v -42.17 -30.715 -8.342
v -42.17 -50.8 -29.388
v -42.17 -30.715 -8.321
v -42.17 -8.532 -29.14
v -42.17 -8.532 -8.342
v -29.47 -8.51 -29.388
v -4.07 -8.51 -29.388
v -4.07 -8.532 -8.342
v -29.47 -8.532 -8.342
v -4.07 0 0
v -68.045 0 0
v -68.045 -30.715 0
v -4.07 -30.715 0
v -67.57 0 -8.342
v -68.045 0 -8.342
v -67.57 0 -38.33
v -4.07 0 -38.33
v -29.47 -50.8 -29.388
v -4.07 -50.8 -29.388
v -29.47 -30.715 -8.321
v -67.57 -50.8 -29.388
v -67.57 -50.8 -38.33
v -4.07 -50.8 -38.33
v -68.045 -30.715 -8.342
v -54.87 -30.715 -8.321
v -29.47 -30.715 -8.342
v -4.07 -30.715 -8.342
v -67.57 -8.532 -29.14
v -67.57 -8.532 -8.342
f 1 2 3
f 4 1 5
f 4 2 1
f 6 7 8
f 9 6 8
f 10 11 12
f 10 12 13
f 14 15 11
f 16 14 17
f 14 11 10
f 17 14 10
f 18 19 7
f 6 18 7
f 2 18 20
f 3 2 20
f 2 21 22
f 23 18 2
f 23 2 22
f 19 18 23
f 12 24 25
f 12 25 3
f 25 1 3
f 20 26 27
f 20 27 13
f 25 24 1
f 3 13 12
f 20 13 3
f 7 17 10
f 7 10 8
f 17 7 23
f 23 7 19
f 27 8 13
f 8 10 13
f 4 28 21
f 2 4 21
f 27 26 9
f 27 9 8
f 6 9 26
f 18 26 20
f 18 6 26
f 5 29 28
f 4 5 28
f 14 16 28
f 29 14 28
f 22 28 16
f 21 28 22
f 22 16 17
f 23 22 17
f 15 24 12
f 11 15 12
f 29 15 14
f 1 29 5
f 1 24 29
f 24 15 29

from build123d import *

# Parameters (mm, degrees)
F0_W      = 96.990541555
F0_H      = 38.3299775422
F1_DEPTH  = 50.8
F3_DEPTH  = 101.6
F5_DEPTH  = 25.4
F7_DEPTH  = 38.1
F8_DEPTH  = 38.1
F9_W      = 33.0152064562
F9_H      = 8.3422744647
F10_DEPTH = 47.752
F11_DEPTH = 25.4
F13_DEPTH = 25.4
F15_DEPTH = 63.5
F17_DEPTH = 25.4
F19_DEPTH = 25.4
F20_DEPTH = 9.906
F22_DEPTH = 25.4


# Not quite as in the source:
# - a feature of the source that left no trace in its solid (it failed there, or was rolled back) is left out


with BuildPart() as f1:
    # F0 (on Front) → F1 (new body)
    with BuildSketch(Plane.XZ):
        with Locations((-52.56479932, -19.1649887711)):
            Rectangle(F0_W, F0_H)
    extrude(amount=F1_DEPTH)

    # F2 (on face) → F3 (cut)
    with BuildSketch(Plane.YZ.offset(-4.0695285425)):
        Polygon((-50.8, 0), (-50.8, -29.3875597417), (-30.714739114, -8.3422744647), (-30.714739114, 0), align=None)
    extrude(amount=-F3_DEPTH, mode=Mode.SUBTRACT)

    # F4 (on face) → F5 (cut)
    with BuildSketch(Plane.YZ.offset(-4.0695285425)):
        Polygon((-8.5318721831, -8.3422744647), (-30.714739114, -8.3422744647), (-50.8, -29.3875597417), (-8.5318721831, -29.3875597417), align=None)
    extrude(amount=-F5_DEPTH, mode=Mode.SUBTRACT)

    # F6 (on face) → F7 (cut)
    with BuildSketch(Plane(origin=(-101.0600700974, 0, 0), x_dir=(0, -1, 0), z_dir=(-1, 0, 0))):
        Polygon((50.8, -29.3875597417), (30.714739114, -8.3422744647), (10.0486502051, -8.3422744647), (10.0486502051, -29.3875597417), align=None)
    extrude(amount=-F7_DEPTH, mode=Mode.SUBTRACT)

    # F8 (cut): a face of the model
    f8_faces = [f1.faces().sort_by_distance(p)[0] for p in [
        (-29.4695285425, -25.1662286777, -19.9579957719),
    ]]
    extrude(f8_faces, amount=-F8_DEPTH, mode=Mode.SUBTRACT)

    # F9 (on face) → F10 (cut)
    with BuildSketch(Plane.XZ.offset(30.714739114)):
        with Locations((-84.5524668694, -4.1711372323)):
            Rectangle(F9_W, F9_H)
    extrude(amount=-F10_DEPTH, mode=Mode.SUBTRACT)

    # F11 (cut): a face of the model
    f11_faces = [f1.faces().sort_by_distance(p)[0] for p in [
        (-84.31479932, -10.0486502051, -18.8649171032),
    ]]
    extrude(f11_faces, amount=-F11_DEPTH, mode=Mode.SUBTRACT)

    # F12 (on face) → F13 (cut)
    with BuildSketch(Plane.XY.offset(-29.3875597417)):
        Polygon((-67.5695285425, -50.8), (-67.5695285425, -8.5318721831), (-67.5695285425, 0), (-101.0600700974, 0), (-101.0600700974, -50.8), align=None)
    extrude(amount=-F13_DEPTH, mode=Mode.SUBTRACT)

    # F14 (on face) → F15 (join)
    with BuildSketch(Plane(origin=(-67.5695285425, 0, 0), x_dir=(0, -1, 0), z_dir=(-1, 0, 0))):
        Polygon((50.8, -29.3875597417), (8.5318721831, -8.3422744647), (8.5318721831, -29.3875597417), align=None)
    extrude(amount=-F15_DEPTH)

    # F16 (on face) → F17 (cut)
    with BuildSketch(Plane.YZ.offset(-4.0695285425)):
        Polygon((-8.5318721831, -8.3422744647), (-50.8, -29.3875597417), (-8.5095763206, -29.3875597417), align=None)
    extrude(amount=-F17_DEPTH, mode=Mode.SUBTRACT)

    # F18 (on face) → F19 (cut)
    with BuildSketch(Plane(origin=(-67.5695285425, 0, 0), x_dir=(0, -1, 0), z_dir=(-1, 0, 0))):
        Polygon((50.8, -29.3875597417), (8.5318721831, -8.3422744647), (8.5318721831, -29.1403066367), align=None)
    extrude(amount=-F19_DEPTH, mode=Mode.SUBTRACT)

    # F20 (add): a face of the model
    f20_faces = [f1.faces().sort_by_distance(p)[0] for p in [
        (-35.8195285425, -29.6659360915, -18.8649171032),
    ]]
    extrude(f20_faces, amount=F20_DEPTH)

    # F21 (on face) → F22 (cut)
    with BuildSketch(Plane.YZ.offset(-29.4695285425)):
        Polygon((-55.2151913765, -20.5199263986), (-50.8, -29.3875597417), (-30.714739114, -8.3211602381), align=None)
        Polygon((-12.9470635596, 0.5253588785), (-14.0022137243, 0), (-12.6854875674, 0), align=None)
    extrude(amount=-F22_DEPTH, mode=Mode.SUBTRACT)


solid = f1.part
